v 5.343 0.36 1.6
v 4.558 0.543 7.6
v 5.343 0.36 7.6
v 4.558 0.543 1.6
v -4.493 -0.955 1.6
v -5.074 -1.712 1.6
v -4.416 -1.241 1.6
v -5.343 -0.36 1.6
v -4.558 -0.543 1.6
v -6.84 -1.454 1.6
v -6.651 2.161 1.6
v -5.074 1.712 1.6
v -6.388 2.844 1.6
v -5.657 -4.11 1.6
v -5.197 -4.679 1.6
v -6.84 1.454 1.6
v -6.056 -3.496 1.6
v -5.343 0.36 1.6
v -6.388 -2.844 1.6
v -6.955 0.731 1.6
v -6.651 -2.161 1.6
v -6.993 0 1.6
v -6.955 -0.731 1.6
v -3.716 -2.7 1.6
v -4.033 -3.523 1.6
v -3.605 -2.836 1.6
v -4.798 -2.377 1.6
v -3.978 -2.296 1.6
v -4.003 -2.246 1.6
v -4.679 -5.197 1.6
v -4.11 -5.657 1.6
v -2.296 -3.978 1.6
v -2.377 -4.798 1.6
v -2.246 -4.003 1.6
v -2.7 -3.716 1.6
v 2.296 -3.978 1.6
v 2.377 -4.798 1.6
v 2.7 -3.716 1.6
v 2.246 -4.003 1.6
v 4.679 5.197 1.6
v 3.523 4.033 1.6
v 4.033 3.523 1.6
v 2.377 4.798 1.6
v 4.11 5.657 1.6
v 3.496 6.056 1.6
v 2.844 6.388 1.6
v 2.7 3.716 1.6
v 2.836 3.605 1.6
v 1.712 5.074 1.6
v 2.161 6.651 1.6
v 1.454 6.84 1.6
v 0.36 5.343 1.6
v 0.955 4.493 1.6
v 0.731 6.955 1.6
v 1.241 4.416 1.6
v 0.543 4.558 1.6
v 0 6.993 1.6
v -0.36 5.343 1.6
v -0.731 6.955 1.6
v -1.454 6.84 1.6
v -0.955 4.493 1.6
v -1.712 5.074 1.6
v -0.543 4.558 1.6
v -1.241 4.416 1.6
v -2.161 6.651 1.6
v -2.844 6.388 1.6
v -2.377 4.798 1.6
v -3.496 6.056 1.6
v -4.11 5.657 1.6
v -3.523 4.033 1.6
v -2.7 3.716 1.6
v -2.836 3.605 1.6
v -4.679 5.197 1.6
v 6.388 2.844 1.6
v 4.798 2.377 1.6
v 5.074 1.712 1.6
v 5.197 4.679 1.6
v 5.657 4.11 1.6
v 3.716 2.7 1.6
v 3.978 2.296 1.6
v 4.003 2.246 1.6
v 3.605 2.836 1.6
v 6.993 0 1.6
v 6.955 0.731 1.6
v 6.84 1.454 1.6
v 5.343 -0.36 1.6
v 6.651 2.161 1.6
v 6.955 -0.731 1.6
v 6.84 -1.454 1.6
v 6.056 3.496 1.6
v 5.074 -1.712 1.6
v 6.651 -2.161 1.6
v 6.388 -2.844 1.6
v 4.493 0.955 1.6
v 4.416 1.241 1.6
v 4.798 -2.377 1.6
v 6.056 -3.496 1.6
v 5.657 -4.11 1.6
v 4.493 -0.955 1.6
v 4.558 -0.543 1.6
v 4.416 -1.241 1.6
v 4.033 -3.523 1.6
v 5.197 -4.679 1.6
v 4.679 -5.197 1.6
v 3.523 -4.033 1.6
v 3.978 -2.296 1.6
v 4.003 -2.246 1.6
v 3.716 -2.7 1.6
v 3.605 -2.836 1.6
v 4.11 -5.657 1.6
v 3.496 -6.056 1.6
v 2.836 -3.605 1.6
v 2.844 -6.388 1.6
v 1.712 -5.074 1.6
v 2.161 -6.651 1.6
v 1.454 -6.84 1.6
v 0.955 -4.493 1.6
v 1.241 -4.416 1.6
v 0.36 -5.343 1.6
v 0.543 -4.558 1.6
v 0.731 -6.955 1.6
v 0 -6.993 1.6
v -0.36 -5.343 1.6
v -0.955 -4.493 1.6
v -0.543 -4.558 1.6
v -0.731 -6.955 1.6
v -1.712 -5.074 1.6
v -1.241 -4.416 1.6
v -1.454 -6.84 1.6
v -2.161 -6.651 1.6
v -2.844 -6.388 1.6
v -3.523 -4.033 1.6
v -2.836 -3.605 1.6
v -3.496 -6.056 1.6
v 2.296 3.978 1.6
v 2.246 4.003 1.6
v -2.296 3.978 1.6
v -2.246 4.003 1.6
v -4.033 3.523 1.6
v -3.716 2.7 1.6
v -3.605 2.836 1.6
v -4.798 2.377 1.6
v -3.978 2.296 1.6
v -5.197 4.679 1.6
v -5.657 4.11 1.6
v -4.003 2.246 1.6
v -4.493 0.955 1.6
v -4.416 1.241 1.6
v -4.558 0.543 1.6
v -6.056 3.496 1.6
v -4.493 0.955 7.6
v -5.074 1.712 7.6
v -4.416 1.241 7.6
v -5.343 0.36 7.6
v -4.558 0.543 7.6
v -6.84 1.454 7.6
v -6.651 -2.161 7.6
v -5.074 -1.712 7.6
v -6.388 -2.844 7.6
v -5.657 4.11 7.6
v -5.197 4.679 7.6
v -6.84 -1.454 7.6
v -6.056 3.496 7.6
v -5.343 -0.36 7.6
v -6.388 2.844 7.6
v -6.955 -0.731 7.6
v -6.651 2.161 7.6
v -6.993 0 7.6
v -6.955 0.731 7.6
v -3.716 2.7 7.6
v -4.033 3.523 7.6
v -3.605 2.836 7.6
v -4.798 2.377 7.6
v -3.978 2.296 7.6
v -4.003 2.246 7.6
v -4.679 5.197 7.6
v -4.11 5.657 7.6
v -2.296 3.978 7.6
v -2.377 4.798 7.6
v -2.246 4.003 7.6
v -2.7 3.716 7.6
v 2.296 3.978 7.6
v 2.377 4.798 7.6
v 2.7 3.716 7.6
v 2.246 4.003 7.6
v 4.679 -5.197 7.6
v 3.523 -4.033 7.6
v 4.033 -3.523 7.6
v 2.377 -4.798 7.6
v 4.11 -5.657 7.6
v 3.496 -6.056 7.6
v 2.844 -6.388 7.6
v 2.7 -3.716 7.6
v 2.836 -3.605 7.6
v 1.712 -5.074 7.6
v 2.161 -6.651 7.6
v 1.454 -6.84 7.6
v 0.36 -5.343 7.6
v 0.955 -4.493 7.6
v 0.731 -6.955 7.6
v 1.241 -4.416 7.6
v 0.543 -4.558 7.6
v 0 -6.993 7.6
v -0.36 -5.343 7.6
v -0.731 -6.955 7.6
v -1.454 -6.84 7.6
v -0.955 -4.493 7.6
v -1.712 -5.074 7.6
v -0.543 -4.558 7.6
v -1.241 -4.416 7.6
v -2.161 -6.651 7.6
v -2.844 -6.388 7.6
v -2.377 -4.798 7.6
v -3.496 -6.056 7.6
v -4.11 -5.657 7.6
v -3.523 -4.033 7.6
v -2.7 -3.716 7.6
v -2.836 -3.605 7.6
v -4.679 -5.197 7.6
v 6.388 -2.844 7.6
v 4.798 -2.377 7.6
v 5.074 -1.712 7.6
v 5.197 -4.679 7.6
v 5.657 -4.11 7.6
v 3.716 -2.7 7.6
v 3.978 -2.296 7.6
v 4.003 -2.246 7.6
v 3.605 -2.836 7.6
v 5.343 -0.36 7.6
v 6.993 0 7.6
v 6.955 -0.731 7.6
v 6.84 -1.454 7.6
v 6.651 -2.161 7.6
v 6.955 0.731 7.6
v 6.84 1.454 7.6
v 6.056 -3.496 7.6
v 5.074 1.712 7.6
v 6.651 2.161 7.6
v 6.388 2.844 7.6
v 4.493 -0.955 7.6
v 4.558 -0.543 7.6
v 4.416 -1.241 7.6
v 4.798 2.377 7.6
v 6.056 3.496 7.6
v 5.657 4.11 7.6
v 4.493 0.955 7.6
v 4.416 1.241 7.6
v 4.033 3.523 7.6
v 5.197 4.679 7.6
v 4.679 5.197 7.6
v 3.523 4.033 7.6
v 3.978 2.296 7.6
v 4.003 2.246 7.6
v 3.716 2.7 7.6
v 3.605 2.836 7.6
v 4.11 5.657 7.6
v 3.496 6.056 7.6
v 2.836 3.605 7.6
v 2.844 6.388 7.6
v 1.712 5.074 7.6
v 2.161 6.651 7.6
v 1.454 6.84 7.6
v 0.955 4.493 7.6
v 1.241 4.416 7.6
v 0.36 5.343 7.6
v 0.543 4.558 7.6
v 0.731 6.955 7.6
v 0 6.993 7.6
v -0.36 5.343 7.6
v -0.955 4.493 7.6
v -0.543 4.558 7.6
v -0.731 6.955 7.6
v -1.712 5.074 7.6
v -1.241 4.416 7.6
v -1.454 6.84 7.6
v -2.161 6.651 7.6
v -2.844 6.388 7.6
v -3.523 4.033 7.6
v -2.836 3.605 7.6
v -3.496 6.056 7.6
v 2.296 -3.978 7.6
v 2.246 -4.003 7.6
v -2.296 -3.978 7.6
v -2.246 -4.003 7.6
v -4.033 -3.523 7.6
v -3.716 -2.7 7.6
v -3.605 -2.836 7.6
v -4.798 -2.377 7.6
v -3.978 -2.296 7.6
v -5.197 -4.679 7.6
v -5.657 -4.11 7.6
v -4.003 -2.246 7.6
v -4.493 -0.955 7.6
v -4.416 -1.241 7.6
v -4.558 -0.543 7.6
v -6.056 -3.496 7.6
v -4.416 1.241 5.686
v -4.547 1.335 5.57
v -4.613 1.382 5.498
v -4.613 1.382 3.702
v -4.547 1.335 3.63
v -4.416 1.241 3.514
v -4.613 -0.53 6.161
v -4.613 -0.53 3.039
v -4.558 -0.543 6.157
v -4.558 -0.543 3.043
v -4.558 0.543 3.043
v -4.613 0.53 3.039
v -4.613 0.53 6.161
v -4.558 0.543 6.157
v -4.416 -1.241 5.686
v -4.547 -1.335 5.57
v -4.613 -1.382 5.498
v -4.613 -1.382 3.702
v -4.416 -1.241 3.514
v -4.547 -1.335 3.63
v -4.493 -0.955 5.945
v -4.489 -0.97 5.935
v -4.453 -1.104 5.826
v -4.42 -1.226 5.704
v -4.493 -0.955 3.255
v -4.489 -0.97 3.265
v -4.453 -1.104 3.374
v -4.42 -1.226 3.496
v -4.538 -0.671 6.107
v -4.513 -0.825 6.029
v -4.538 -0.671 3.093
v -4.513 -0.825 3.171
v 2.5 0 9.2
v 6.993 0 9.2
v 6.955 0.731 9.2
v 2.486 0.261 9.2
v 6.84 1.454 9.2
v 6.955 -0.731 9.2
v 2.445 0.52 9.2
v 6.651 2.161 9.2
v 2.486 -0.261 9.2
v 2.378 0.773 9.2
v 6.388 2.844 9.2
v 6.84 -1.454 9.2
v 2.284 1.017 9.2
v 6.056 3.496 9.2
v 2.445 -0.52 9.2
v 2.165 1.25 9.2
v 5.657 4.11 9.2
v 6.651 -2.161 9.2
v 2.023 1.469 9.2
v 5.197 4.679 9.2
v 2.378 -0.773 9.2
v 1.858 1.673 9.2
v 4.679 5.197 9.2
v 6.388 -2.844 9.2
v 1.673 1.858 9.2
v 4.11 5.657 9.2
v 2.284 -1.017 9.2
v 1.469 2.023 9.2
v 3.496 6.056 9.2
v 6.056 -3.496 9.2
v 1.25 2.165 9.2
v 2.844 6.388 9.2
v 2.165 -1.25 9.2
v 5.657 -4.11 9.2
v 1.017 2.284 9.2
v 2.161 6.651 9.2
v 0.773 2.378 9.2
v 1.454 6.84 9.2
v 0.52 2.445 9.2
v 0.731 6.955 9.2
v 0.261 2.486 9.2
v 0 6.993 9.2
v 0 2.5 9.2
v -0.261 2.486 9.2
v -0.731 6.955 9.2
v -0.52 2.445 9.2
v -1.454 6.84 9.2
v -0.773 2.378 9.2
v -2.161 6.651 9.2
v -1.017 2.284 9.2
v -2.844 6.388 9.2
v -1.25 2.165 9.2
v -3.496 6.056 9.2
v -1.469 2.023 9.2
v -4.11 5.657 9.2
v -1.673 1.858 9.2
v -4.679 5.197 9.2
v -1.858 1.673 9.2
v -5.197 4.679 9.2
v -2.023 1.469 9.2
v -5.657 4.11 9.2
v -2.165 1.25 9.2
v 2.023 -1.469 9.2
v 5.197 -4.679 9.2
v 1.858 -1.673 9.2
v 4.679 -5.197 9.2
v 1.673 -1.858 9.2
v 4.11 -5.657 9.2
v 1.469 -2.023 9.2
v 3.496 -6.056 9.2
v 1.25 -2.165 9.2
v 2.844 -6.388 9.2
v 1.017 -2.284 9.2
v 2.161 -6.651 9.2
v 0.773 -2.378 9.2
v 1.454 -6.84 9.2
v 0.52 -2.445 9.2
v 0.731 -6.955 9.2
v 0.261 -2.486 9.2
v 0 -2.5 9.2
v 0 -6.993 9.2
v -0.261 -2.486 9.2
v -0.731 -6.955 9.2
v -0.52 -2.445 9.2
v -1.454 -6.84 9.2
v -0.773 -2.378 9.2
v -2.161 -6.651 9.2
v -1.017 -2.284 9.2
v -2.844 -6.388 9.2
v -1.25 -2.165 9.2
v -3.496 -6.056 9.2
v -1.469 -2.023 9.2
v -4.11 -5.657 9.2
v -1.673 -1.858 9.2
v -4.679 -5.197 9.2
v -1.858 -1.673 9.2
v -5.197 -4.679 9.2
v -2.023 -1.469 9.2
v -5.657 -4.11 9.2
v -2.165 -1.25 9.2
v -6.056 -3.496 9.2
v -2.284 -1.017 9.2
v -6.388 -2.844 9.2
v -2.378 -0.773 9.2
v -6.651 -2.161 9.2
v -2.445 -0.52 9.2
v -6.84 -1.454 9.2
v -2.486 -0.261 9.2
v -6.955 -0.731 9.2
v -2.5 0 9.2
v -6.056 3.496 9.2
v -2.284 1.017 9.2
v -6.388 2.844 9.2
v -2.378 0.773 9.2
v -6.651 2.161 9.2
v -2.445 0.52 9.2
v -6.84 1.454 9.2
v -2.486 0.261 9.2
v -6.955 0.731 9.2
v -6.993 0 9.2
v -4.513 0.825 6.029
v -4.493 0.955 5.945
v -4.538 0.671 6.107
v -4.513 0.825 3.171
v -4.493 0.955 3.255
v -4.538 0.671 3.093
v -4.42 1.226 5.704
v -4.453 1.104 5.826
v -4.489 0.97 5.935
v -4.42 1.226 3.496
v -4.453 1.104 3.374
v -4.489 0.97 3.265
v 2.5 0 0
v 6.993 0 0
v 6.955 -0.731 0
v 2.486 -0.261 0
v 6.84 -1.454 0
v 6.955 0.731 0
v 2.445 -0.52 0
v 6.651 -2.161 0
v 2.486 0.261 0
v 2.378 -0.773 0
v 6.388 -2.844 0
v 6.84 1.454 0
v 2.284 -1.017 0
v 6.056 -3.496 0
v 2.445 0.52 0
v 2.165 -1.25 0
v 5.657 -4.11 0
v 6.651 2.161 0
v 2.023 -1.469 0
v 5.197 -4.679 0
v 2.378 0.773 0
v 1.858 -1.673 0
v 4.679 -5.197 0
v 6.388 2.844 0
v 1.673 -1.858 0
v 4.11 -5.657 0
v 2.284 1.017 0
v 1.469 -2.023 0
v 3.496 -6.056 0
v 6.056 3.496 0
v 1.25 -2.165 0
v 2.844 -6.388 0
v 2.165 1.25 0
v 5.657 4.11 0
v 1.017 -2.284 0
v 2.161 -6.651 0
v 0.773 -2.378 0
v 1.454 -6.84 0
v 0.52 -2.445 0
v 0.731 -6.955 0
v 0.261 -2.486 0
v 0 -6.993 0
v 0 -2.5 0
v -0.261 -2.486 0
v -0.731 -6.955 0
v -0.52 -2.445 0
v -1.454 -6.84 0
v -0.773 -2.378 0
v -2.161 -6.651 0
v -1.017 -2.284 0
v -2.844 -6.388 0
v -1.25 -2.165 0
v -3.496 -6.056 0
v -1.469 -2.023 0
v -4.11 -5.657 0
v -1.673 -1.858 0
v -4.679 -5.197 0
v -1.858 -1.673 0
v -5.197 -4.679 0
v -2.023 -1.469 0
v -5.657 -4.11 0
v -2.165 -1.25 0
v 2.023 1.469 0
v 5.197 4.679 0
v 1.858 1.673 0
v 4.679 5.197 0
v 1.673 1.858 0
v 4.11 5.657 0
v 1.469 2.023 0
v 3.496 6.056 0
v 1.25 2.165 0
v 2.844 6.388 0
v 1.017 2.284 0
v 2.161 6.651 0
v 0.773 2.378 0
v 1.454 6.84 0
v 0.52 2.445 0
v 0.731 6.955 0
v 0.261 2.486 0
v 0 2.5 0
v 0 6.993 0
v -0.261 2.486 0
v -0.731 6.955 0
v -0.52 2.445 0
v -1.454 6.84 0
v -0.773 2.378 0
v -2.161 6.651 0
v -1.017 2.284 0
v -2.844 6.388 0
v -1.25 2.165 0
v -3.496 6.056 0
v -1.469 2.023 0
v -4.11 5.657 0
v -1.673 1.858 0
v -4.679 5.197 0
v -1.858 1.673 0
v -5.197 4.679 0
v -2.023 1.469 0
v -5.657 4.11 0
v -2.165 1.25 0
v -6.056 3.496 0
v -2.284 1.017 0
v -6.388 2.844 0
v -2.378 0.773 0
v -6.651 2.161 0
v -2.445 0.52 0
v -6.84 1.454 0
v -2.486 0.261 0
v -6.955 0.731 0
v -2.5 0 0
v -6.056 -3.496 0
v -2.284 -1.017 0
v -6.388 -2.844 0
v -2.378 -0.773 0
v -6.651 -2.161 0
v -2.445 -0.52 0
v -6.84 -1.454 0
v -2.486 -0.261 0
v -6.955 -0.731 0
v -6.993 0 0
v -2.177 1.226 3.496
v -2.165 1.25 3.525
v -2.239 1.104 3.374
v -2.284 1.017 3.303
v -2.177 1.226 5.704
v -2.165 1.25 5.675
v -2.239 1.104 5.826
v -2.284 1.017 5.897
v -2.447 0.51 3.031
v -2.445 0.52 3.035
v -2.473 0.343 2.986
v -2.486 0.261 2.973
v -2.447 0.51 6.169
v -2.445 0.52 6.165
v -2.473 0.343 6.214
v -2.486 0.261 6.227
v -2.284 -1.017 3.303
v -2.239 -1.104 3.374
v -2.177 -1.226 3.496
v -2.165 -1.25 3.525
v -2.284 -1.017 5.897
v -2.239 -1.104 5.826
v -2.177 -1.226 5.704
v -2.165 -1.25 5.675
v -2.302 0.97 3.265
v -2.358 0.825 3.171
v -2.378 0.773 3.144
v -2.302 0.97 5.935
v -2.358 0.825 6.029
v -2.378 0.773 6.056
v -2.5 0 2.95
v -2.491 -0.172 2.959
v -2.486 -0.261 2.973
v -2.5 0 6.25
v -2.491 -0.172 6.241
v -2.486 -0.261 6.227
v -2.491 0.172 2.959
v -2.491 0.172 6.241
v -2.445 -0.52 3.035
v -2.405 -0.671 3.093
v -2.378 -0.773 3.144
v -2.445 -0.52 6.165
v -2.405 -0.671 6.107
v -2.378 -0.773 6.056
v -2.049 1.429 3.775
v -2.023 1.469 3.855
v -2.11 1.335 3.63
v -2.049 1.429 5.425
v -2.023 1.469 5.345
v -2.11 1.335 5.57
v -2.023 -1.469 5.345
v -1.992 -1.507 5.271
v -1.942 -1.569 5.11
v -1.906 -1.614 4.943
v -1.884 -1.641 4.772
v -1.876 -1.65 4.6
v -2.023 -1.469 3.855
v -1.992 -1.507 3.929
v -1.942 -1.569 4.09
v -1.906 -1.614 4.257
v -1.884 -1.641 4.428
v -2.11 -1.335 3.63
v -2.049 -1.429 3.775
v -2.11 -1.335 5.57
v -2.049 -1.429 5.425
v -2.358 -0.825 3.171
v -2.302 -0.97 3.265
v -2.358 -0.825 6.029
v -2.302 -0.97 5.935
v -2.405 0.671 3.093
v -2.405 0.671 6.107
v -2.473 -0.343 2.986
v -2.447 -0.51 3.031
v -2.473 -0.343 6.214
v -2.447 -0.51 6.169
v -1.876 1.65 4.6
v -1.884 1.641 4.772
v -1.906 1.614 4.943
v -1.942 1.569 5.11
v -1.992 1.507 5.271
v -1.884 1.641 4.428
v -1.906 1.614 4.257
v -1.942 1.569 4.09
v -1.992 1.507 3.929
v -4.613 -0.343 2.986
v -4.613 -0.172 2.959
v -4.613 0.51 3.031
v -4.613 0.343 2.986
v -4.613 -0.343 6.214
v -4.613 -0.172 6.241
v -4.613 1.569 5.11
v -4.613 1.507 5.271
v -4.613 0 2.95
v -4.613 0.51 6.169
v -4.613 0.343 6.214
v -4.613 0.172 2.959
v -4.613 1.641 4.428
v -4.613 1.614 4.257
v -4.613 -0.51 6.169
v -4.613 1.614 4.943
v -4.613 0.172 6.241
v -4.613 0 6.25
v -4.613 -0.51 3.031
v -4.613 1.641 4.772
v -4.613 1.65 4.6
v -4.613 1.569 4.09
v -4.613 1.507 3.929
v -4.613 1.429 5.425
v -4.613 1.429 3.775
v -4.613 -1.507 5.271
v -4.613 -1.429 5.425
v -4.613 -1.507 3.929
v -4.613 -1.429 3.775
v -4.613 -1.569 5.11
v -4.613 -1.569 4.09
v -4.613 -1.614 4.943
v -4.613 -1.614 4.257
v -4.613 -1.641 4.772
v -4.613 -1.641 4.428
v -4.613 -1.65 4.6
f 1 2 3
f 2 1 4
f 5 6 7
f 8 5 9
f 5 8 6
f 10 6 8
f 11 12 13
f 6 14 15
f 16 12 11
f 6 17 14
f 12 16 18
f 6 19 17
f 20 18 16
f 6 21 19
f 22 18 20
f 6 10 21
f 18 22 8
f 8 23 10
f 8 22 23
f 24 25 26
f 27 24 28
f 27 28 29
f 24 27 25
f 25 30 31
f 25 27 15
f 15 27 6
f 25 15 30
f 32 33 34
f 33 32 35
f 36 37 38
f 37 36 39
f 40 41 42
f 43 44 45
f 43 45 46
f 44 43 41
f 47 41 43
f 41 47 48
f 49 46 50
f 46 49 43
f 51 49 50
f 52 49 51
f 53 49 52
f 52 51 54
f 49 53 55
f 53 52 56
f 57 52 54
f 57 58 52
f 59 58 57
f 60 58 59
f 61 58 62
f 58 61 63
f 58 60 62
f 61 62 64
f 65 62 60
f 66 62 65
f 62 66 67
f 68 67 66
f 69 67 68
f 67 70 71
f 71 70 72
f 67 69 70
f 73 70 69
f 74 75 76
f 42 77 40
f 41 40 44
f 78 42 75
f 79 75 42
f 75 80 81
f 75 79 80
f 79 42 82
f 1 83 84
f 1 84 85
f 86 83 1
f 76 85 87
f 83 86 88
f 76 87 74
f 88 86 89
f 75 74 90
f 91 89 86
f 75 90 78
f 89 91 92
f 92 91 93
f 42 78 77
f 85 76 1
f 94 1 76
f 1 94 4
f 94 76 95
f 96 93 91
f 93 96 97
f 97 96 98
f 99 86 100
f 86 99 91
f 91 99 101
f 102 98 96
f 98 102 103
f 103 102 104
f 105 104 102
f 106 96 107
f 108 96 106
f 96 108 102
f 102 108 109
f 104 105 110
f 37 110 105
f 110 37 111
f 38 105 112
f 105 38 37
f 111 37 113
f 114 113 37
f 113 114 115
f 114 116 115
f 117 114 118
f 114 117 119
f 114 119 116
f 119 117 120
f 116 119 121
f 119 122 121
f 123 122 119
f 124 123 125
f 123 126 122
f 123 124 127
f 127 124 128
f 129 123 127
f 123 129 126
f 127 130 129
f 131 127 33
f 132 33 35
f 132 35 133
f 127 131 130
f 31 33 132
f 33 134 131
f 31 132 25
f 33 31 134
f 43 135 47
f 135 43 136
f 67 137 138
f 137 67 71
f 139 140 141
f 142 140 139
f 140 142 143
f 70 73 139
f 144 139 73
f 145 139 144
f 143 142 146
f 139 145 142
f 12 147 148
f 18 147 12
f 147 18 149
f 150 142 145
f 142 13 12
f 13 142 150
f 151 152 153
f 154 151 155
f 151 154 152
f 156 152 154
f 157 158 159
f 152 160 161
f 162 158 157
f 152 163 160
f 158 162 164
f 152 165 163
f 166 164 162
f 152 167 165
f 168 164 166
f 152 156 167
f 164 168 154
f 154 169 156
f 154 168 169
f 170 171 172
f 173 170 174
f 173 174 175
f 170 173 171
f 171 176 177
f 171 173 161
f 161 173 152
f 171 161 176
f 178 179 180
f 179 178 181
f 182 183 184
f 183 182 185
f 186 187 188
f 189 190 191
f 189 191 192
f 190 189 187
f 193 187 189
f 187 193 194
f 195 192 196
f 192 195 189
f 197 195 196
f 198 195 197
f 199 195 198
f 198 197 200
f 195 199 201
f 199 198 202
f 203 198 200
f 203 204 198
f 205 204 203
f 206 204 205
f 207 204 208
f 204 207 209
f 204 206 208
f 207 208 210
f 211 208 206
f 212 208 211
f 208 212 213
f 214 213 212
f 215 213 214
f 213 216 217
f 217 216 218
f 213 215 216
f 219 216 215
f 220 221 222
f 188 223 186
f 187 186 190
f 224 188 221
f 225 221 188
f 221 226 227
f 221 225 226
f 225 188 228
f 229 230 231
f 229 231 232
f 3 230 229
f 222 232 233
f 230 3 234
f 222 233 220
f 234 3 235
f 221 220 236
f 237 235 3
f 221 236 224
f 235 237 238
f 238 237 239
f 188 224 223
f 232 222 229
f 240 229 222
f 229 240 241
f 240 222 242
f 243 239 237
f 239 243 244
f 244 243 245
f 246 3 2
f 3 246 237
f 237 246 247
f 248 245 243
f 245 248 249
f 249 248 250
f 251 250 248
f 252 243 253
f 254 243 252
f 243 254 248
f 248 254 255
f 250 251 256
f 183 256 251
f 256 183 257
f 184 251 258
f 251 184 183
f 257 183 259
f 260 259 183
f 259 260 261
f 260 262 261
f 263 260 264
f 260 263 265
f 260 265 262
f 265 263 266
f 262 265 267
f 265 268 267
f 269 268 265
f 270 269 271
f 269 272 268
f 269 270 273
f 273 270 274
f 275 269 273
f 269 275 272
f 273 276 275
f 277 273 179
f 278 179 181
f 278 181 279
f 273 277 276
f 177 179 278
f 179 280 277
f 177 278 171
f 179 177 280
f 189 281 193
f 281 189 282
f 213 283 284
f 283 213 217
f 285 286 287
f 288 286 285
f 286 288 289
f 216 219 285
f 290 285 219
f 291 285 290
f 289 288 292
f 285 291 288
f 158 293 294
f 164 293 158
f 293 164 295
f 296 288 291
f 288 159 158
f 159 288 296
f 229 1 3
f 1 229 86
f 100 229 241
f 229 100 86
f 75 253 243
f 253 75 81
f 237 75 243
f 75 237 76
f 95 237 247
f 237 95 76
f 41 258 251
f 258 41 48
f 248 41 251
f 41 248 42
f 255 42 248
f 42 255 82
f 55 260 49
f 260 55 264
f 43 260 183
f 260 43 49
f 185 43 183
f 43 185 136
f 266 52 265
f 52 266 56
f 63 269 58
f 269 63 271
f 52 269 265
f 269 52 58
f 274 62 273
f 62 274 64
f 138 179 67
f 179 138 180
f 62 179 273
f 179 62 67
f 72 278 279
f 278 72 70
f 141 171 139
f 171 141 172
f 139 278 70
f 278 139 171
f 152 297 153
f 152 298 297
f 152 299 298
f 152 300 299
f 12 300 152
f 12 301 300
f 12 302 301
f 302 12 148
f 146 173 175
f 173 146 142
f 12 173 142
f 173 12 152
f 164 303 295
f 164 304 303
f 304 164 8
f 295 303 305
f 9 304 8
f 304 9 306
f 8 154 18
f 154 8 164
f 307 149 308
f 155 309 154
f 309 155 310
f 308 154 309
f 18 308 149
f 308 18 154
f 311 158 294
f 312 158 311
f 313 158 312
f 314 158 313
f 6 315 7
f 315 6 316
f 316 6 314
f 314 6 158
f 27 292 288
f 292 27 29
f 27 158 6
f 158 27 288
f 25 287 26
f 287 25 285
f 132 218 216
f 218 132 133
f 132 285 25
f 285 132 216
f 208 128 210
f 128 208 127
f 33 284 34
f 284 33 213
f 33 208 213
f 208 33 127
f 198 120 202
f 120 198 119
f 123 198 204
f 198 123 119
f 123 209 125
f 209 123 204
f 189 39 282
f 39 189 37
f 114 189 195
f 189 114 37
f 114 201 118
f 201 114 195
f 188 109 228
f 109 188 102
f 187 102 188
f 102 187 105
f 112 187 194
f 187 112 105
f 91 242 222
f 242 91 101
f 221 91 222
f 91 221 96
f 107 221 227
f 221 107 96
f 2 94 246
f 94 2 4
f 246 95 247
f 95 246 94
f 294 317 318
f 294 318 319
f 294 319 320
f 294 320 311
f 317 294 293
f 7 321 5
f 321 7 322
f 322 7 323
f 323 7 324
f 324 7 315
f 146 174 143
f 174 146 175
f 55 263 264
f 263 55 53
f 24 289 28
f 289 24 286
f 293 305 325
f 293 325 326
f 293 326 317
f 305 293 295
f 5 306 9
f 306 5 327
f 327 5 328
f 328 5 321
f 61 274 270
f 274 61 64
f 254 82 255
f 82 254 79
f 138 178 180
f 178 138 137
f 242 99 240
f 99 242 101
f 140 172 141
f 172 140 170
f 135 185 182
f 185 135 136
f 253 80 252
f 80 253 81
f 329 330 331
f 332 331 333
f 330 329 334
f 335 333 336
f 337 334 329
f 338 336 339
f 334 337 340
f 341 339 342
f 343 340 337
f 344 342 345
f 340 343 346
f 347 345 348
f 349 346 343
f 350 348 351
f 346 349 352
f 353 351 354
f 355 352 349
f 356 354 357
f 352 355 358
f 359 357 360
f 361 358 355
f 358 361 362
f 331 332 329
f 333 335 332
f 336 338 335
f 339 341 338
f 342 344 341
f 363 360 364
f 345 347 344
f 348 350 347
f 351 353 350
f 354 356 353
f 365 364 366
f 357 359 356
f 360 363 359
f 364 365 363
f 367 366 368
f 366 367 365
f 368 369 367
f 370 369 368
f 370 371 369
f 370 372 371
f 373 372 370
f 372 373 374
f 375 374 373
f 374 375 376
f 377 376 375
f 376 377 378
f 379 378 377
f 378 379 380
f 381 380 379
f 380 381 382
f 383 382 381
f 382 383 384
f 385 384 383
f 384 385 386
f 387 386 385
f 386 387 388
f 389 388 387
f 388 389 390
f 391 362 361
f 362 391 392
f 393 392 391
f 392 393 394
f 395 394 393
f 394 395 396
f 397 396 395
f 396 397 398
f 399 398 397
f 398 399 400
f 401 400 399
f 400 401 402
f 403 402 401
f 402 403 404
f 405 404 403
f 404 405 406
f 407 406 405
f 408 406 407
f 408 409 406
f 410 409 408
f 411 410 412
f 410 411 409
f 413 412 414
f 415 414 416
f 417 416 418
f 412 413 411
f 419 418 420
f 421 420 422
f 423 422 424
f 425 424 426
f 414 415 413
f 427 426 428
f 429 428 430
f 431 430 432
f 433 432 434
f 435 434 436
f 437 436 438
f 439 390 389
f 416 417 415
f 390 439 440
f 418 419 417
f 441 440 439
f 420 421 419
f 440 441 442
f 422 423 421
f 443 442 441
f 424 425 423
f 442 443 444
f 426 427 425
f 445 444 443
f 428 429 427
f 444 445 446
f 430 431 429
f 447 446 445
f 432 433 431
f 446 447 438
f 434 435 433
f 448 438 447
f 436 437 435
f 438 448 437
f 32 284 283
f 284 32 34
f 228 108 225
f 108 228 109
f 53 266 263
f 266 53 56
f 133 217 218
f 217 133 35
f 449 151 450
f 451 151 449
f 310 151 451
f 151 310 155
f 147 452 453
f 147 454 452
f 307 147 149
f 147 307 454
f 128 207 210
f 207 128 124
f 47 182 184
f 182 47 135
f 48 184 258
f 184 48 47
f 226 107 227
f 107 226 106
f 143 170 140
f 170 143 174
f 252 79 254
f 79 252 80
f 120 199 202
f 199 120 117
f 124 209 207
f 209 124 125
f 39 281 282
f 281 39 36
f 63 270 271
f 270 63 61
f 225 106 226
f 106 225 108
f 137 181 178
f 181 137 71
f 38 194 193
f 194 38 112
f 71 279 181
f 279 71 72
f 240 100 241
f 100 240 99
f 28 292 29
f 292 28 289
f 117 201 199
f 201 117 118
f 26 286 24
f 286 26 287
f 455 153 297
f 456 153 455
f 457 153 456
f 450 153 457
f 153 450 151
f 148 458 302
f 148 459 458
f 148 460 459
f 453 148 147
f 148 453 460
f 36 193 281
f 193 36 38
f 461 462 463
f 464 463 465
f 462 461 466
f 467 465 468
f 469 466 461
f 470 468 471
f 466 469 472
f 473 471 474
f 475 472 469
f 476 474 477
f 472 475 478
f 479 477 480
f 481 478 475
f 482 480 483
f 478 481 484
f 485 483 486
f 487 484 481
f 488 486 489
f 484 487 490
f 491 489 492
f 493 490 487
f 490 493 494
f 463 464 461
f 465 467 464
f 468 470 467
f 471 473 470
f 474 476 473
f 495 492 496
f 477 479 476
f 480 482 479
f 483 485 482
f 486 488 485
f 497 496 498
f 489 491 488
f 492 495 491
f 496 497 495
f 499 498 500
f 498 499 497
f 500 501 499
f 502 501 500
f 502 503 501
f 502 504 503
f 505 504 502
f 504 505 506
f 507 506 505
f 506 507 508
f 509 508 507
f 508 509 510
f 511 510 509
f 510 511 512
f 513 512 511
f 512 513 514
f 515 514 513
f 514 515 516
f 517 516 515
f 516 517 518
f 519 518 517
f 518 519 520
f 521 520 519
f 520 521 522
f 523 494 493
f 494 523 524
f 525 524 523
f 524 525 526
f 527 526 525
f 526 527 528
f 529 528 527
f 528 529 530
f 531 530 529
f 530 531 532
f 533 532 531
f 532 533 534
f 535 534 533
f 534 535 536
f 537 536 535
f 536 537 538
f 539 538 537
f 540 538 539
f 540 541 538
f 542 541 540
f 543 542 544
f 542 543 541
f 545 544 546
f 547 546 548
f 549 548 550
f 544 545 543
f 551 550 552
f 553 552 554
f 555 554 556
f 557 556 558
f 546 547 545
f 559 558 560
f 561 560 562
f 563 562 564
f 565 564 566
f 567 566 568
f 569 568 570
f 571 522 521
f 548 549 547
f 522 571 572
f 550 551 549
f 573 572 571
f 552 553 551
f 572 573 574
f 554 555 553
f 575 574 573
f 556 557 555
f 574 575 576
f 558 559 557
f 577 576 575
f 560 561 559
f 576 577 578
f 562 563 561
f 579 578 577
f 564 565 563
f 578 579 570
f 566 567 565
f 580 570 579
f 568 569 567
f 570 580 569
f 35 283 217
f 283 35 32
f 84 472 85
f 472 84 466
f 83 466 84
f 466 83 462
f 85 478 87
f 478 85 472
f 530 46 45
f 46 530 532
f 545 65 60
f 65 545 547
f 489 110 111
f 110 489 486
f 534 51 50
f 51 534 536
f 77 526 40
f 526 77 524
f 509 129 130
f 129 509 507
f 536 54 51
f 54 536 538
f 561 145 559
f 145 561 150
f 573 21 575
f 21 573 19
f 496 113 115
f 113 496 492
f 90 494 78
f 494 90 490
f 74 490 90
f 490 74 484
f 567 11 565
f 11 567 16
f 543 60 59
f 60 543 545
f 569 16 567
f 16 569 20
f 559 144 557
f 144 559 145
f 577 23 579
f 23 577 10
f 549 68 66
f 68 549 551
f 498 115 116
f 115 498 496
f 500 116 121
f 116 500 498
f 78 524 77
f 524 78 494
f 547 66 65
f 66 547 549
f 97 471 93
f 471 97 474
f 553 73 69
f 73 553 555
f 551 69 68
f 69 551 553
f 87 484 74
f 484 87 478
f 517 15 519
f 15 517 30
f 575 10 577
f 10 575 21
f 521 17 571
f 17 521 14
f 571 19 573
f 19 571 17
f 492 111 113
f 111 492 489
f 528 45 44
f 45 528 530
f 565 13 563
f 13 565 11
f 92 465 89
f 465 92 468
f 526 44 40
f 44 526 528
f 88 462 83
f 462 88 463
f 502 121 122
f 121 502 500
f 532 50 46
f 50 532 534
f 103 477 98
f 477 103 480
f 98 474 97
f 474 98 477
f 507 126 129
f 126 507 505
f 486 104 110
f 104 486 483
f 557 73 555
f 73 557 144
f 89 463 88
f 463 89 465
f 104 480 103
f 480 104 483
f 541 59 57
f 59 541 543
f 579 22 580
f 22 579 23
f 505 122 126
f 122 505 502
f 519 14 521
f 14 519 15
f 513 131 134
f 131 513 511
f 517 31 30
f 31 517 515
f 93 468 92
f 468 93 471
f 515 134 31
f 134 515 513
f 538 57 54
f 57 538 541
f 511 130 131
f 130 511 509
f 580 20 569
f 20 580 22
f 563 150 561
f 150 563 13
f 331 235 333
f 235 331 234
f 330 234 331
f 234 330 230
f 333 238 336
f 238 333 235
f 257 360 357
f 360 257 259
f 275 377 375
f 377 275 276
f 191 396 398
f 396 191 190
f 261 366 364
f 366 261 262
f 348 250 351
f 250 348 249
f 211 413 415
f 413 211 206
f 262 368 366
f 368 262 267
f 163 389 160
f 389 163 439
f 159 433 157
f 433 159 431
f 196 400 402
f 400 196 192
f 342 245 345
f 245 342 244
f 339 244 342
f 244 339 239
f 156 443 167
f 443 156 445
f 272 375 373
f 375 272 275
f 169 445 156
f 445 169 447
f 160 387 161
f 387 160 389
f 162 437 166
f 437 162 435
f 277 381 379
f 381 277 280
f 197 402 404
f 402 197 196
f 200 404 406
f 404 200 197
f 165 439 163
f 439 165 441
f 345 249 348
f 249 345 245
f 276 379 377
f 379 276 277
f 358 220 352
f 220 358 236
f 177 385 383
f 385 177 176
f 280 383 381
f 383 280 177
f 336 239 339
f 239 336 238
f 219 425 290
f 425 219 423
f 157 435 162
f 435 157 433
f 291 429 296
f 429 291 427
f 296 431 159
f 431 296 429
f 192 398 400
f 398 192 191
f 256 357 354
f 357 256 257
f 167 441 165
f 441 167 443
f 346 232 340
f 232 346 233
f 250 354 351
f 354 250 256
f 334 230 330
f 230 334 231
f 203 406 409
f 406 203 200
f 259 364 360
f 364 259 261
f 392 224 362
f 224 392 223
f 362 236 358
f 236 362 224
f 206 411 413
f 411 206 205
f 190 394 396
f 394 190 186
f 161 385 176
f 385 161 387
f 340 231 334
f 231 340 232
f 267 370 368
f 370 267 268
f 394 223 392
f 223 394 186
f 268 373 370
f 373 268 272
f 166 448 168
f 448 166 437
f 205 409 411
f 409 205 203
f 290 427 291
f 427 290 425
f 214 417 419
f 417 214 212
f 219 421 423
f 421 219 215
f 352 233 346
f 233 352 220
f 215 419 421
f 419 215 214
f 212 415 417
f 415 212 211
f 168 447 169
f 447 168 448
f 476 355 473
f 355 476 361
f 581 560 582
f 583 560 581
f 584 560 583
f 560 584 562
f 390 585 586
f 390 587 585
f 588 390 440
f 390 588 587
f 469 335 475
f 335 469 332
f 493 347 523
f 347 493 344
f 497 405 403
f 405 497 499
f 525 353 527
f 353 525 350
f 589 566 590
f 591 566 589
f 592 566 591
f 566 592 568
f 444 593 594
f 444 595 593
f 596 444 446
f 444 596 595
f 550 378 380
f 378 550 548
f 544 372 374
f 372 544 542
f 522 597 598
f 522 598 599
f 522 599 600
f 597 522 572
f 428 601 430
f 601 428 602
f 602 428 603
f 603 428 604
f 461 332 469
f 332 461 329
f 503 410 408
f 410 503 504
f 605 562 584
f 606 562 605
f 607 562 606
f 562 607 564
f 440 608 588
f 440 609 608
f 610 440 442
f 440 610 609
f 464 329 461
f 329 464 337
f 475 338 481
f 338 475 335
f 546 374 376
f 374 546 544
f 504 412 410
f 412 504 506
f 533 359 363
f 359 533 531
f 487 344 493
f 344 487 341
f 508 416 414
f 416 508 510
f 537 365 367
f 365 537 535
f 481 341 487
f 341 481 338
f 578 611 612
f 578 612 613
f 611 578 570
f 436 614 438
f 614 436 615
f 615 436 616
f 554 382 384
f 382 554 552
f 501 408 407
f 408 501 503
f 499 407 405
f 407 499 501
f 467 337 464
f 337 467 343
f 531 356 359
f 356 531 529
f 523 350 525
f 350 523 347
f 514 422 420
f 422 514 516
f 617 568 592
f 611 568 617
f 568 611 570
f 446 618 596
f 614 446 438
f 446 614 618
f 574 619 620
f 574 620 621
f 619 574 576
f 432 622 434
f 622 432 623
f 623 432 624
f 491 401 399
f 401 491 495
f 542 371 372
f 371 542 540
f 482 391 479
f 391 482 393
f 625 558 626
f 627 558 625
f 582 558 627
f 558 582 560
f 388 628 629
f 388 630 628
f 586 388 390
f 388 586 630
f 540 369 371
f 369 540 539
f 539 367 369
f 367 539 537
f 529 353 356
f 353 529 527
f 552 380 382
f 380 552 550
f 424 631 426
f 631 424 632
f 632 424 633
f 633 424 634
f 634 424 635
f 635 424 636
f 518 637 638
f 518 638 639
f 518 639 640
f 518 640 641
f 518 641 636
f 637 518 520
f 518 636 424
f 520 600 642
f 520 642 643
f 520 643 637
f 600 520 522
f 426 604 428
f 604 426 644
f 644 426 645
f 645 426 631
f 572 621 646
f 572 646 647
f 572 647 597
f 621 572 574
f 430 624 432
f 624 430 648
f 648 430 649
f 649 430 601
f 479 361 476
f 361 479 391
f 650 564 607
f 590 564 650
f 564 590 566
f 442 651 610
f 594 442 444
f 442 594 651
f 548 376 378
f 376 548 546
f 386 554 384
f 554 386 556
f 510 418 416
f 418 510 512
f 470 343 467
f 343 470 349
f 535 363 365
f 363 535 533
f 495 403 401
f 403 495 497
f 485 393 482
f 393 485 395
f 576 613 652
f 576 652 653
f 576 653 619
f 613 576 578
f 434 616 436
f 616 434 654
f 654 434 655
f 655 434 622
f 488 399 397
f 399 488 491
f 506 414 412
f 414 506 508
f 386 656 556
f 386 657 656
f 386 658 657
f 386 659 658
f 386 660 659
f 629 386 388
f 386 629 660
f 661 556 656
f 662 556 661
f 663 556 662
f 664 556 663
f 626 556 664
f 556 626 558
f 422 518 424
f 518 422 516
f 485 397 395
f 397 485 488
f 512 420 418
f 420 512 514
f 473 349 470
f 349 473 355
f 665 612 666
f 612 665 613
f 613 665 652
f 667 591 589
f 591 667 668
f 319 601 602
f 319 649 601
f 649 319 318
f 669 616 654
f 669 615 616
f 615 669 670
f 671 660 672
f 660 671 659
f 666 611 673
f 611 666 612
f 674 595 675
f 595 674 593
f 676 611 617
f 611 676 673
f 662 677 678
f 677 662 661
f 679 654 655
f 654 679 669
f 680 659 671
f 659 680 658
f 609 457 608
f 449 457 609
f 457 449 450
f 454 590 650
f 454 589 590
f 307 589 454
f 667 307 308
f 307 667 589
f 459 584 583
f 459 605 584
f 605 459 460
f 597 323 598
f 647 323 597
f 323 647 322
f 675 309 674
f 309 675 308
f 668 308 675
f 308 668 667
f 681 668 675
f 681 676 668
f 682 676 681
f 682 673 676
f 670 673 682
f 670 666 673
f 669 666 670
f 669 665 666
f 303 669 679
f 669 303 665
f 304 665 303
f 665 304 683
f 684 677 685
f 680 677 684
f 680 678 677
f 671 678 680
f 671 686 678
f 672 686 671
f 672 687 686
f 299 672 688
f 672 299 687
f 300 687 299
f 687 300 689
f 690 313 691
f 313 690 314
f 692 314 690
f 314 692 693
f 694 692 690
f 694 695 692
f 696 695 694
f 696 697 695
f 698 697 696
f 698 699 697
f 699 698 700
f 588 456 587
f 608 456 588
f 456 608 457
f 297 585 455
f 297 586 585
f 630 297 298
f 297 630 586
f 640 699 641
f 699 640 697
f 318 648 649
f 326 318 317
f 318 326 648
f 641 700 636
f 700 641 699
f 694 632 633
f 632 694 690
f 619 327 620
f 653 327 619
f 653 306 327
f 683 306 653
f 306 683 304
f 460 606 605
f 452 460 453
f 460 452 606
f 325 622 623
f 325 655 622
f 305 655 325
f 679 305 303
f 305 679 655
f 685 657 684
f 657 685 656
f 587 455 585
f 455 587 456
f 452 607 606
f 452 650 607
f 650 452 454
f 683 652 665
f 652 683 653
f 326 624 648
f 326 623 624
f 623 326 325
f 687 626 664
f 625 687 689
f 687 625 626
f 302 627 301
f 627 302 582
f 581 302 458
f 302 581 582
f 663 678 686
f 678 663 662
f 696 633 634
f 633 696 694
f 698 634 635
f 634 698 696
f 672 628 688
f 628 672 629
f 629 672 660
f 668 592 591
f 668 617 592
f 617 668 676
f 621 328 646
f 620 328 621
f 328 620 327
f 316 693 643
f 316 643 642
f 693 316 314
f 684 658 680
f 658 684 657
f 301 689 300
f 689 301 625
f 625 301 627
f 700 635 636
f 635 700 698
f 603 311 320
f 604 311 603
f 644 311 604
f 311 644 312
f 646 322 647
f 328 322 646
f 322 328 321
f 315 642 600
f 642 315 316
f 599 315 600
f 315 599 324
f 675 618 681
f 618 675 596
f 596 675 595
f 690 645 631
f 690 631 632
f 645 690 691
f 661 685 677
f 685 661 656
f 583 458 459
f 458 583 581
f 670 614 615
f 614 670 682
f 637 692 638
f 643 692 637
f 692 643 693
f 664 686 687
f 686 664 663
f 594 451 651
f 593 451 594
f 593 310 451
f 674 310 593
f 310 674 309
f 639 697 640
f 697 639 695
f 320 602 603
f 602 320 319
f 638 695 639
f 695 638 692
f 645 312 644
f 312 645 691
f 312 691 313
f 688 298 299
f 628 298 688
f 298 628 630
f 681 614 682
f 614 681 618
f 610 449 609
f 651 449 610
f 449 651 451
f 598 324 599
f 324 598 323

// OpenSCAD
// GT2 pulley, 16 teeth for 6 mm belt.
$fn = 60;
eps = 0.02;
teeth = 16;
belt_pitch = 2;
belt_w = 6;
shaft_d = 5;
set_screw_d = 3.3;
tooth_depth = 0.75;
tooth_overlap = 0.28;
tooth_base_w = 1.2;
tooth_tip_w = 0.72;
flange_t = 1.6;
core_d = teeth * belt_pitch / PI - 1.0;
body_h = belt_w + 2 * flange_t;
module tooth() {
    linear_extrude(height = belt_w)
        polygon(points = [[-tooth_overlap, -tooth_base_w / 2], [tooth_depth, -tooth_tip_w / 2], [tooth_depth, tooth_tip_w / 2], [-tooth_overlap, tooth_base_w / 2]]);
}
difference() {
    union() {
        cylinder(d = core_d, h = body_h);
        cylinder(d = core_d + 4.8, h = flange_t);
        translate([0, 0, body_h - flange_t]) cylinder(d = core_d + 4.8, h = flange_t);
        for (i = [0 : teeth - 1]) rotate([0, 0, i * 360 / teeth]) translate([core_d / 2, 0, flange_t]) tooth();
    }
    translate([0, 0, -eps]) cylinder(d = shaft_d, h = body_h + 2 * eps);
    translate([-core_d / 2 - eps, 0, body_h / 2]) rotate([0, 90, 0]) cylinder(d = set_screw_d, h = core_d / 2 + 2 * eps);
}
